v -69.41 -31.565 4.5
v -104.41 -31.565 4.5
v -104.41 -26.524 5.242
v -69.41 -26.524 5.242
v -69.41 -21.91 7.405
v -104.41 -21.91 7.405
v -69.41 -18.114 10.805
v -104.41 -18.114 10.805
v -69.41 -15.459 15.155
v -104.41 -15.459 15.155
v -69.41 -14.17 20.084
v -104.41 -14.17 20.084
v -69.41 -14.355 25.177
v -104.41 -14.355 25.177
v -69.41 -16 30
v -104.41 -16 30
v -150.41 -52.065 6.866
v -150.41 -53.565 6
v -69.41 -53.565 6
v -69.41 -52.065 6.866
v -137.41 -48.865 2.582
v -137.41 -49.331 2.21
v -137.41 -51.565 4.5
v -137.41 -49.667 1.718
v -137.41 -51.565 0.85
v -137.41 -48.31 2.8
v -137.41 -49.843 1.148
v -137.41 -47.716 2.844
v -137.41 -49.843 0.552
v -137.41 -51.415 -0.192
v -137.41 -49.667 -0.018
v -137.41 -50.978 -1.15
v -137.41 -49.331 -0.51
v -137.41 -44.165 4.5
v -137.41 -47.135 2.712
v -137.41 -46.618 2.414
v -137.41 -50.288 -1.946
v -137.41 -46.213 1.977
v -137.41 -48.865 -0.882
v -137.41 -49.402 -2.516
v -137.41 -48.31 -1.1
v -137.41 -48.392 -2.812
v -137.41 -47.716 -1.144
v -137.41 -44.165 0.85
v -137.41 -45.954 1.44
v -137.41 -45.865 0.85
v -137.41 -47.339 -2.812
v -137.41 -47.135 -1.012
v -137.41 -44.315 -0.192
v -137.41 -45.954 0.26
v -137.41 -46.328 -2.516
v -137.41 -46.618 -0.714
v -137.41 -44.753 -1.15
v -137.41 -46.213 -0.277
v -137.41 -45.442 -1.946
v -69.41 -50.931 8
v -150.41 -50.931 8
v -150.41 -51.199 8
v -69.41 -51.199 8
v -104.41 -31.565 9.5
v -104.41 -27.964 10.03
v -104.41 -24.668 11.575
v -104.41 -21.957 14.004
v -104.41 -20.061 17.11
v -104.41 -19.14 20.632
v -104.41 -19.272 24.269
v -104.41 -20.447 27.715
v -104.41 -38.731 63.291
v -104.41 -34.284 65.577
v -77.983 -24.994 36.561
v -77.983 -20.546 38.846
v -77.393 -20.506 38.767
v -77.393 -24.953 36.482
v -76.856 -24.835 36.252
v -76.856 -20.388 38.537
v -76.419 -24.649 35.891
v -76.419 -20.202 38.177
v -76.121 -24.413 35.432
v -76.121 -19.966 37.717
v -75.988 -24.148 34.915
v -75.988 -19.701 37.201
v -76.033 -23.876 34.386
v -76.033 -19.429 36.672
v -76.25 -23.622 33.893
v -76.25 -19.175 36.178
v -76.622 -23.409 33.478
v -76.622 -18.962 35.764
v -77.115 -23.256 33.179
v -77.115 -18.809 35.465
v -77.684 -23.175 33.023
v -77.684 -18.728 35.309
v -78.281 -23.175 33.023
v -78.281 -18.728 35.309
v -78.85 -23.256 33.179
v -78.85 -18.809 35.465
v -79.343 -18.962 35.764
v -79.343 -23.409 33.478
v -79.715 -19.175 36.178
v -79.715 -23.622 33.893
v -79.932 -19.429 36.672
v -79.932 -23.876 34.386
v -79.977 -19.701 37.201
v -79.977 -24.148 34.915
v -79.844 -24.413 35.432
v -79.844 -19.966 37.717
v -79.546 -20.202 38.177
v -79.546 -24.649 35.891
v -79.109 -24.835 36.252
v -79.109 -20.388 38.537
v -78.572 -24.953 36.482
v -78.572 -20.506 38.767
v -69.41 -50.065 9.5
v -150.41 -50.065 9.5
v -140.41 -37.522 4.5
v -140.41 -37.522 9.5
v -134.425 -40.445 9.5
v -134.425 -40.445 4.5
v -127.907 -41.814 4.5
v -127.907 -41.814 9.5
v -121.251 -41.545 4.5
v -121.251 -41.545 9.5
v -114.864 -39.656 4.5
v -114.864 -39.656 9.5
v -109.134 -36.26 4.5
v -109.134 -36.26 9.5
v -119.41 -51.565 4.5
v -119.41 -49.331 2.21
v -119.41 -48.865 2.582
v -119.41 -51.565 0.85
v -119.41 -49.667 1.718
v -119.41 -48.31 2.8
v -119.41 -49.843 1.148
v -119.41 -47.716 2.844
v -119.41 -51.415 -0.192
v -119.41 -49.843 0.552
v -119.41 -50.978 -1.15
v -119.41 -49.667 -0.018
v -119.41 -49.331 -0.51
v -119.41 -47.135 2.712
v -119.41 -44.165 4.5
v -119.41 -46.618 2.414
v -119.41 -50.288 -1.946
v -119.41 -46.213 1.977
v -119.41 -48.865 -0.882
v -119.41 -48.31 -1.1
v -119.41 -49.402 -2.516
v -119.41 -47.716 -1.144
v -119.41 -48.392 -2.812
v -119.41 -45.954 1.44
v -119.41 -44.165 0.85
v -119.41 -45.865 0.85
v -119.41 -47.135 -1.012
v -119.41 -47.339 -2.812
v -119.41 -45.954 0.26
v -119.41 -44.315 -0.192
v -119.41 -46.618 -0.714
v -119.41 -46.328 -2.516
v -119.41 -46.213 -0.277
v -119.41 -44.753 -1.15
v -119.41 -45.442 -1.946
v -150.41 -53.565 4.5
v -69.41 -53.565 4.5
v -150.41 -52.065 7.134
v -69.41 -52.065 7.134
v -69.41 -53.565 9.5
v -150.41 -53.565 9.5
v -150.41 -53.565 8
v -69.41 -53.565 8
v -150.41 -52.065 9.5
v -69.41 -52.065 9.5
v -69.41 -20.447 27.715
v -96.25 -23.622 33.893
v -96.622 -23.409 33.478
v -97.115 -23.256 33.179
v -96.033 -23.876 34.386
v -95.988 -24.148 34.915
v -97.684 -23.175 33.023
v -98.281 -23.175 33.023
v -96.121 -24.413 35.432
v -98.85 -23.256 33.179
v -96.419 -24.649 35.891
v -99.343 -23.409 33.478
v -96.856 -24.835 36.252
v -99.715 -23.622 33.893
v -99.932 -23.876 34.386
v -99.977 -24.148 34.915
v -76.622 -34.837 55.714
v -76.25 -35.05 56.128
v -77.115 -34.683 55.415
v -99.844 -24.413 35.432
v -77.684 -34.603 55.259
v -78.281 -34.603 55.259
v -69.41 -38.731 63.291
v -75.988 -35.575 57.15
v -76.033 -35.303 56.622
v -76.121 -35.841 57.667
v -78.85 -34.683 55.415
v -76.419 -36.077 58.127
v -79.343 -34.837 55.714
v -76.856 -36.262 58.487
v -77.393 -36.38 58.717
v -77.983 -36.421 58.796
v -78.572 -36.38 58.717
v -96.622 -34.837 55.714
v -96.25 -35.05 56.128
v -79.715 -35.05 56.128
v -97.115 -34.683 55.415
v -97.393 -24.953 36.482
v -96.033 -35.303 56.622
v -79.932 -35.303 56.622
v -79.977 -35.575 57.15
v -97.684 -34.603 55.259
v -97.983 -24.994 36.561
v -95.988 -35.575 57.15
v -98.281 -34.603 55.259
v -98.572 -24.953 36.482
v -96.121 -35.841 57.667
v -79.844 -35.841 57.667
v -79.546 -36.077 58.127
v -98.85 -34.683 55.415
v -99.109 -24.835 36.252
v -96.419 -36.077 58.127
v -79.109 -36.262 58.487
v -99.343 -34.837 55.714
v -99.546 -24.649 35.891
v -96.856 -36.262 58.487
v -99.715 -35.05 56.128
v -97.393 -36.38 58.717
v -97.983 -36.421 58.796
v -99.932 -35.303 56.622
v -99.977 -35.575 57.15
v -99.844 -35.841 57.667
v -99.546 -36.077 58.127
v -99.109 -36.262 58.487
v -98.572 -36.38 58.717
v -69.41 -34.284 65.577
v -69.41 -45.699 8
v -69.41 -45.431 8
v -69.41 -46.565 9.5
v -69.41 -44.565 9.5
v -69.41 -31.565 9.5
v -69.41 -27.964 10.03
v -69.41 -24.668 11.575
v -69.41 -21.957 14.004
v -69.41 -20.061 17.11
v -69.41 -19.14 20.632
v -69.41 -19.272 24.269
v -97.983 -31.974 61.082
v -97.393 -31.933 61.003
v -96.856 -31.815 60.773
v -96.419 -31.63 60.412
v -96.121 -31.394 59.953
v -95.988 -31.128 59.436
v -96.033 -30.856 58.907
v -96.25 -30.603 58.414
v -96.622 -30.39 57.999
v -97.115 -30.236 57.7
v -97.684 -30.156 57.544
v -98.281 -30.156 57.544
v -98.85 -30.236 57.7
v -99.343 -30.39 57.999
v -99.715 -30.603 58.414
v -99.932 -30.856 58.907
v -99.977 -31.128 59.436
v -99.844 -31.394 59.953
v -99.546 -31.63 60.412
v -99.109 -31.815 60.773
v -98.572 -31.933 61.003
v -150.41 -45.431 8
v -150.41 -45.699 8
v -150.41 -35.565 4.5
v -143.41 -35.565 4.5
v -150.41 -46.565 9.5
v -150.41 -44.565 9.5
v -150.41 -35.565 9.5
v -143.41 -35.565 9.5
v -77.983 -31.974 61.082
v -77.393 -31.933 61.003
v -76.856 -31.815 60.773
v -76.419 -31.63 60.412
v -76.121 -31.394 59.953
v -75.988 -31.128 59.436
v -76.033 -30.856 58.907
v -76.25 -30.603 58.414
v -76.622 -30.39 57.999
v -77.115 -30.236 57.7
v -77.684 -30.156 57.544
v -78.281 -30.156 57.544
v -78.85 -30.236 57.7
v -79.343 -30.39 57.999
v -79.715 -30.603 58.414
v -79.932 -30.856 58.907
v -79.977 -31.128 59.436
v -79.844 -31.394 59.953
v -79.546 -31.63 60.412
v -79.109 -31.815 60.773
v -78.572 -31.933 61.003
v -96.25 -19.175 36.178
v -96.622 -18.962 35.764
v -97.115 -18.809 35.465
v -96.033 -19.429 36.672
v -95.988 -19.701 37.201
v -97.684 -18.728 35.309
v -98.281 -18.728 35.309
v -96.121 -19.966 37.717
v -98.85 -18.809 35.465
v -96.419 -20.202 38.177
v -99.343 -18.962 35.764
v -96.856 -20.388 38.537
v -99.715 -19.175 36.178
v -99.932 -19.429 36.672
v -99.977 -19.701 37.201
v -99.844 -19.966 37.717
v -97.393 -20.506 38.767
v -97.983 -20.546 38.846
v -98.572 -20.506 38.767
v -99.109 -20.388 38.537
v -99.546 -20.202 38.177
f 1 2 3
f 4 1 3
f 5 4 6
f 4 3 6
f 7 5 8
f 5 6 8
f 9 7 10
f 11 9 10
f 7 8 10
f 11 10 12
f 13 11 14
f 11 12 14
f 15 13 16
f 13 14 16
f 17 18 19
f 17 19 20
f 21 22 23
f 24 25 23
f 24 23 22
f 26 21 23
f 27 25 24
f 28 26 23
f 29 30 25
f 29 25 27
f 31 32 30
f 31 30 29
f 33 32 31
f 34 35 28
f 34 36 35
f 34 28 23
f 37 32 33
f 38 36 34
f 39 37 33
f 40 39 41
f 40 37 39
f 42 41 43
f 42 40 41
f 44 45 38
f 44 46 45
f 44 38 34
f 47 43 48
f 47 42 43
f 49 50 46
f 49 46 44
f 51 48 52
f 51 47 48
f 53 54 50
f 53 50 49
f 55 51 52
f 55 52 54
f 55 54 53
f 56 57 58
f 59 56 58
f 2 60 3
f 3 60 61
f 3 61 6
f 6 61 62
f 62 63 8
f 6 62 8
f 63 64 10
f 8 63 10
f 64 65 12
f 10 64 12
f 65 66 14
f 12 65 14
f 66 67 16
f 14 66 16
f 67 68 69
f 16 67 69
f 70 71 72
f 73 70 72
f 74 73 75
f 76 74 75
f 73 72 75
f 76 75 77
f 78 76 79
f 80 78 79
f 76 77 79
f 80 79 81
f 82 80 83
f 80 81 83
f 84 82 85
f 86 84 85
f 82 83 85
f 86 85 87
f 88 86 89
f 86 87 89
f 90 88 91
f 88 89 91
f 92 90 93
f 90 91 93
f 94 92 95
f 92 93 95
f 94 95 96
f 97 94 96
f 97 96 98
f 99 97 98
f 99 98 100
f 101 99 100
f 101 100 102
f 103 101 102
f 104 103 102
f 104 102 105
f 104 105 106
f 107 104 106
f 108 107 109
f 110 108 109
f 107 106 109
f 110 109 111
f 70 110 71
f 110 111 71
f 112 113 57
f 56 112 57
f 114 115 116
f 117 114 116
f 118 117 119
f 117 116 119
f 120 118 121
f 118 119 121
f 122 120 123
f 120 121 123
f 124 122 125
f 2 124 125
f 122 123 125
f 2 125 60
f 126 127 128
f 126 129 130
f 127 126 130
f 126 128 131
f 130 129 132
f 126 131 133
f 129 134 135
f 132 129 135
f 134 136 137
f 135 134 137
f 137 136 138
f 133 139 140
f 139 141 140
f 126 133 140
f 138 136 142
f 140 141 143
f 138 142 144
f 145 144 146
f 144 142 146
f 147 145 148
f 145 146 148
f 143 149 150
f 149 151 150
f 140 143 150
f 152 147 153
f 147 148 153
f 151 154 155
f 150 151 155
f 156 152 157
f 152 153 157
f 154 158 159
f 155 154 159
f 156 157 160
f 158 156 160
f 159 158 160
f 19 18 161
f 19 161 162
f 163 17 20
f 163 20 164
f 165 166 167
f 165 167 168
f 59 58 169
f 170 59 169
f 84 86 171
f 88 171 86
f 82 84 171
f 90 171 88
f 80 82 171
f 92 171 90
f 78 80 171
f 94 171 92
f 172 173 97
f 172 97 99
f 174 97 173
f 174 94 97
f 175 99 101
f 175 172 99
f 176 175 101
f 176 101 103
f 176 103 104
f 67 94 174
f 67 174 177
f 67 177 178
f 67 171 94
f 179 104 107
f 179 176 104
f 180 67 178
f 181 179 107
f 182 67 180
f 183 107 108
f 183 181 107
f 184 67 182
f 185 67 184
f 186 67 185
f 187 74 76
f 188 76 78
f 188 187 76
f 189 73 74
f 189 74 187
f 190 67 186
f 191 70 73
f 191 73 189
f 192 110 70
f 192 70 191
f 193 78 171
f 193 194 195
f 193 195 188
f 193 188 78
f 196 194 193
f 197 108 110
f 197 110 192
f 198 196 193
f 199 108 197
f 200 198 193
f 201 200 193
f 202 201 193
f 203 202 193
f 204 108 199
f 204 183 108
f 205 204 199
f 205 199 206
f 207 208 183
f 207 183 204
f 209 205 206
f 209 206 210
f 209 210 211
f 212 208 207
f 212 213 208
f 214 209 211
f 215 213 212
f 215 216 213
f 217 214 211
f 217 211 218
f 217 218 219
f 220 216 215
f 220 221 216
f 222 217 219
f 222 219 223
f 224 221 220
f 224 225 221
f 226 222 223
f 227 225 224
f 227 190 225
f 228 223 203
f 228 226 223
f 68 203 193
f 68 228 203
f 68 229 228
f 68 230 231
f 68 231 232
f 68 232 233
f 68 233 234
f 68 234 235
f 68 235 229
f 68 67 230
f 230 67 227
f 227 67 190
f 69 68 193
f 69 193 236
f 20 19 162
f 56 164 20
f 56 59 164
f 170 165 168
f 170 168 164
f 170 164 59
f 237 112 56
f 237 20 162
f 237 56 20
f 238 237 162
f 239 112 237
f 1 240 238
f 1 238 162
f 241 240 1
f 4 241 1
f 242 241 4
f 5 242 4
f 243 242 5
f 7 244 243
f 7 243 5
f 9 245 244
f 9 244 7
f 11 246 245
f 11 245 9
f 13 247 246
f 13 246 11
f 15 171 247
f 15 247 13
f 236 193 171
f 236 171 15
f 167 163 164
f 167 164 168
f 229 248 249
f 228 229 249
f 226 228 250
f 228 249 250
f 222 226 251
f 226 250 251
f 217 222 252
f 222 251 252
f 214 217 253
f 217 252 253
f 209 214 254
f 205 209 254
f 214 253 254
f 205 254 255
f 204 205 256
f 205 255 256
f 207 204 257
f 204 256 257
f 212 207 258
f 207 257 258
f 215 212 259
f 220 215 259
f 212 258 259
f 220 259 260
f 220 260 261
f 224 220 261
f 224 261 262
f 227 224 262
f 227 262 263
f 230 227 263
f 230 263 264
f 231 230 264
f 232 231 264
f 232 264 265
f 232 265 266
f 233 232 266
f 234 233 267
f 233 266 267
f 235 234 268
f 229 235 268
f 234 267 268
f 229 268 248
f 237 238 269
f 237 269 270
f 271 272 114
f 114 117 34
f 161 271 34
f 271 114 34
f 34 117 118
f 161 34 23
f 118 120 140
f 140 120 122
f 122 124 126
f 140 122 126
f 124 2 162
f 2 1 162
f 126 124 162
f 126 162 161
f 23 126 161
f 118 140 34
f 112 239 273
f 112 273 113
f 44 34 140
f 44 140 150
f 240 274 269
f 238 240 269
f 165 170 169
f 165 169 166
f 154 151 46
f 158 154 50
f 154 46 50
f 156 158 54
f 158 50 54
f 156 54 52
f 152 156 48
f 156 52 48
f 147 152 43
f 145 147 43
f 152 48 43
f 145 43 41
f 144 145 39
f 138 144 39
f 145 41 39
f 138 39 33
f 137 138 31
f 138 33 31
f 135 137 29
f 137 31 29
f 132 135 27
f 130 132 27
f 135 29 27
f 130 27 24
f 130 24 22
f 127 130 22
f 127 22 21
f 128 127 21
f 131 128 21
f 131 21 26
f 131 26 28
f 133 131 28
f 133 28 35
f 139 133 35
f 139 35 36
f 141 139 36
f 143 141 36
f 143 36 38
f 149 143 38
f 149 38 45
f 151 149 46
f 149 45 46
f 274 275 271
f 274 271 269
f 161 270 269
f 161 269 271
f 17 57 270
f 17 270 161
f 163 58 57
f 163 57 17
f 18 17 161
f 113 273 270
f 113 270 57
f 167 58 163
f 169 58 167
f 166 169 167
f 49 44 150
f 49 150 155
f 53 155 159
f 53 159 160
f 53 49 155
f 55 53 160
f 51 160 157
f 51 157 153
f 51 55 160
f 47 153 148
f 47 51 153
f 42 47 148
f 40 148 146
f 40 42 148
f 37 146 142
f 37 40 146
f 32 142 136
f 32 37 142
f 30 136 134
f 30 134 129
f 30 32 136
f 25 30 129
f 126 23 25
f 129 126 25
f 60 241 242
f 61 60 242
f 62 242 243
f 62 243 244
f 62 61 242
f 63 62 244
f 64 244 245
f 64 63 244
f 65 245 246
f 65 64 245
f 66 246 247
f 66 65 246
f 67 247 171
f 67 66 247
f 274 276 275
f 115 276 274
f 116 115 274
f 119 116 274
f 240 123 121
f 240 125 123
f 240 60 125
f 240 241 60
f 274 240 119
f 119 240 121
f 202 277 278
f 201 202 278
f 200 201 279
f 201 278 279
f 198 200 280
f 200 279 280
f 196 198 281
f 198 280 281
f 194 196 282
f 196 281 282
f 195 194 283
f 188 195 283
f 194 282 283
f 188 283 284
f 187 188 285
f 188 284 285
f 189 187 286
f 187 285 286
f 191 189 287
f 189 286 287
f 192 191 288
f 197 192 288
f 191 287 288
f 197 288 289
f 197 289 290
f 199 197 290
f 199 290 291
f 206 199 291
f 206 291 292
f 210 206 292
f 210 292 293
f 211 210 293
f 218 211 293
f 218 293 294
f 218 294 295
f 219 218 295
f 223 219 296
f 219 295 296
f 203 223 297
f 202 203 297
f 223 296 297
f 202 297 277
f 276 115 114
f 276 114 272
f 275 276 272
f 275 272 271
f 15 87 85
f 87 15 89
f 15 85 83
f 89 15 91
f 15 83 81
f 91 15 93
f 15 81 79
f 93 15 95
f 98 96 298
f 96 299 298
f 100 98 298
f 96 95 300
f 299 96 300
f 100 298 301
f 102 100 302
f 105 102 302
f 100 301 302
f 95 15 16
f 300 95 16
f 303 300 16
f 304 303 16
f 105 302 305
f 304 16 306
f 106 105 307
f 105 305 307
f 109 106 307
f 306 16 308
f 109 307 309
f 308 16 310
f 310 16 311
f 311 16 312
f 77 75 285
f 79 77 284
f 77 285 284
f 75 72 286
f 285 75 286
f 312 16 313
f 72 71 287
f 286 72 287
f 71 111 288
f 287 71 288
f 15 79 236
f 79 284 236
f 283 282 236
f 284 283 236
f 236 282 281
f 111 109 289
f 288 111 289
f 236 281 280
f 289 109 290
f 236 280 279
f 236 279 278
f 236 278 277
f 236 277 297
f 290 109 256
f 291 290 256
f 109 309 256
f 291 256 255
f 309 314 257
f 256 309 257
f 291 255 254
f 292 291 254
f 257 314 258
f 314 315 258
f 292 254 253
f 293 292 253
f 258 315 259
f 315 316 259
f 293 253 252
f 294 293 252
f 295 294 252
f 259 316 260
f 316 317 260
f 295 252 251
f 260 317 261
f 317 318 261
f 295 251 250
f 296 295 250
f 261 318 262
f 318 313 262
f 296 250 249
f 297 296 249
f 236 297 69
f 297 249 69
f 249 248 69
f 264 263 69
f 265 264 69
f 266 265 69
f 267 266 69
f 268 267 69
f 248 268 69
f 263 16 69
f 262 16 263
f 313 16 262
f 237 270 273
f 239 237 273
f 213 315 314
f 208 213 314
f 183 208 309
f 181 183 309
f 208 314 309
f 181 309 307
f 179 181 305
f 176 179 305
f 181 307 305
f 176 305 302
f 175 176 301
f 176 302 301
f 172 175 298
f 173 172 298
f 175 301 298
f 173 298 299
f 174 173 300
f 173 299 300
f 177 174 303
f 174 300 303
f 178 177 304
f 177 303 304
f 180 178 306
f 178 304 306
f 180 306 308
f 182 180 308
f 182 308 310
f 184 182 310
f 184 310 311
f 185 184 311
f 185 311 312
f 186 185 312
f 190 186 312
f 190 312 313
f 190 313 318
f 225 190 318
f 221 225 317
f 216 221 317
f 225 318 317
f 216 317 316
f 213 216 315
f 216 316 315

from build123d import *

# Parameters (mm, degrees)
PAD018_DEPTH    = 35
SKETCH027_R     = 2
POCKET014_DEPTH = 5
PAD019_DEPTH    = 5
SKETCH029_R     = 2
PAD020_DEPTH    = 18
POCKET015_DEPTH = 81


with BuildPart() as part:
    # Sketch026 → Pad018 (new body)
    with BuildSketch(Plane.YZ):
        with BuildLine():
            Line((-16, 30), (-34.2839170823, 65.5766549317))
            Line((-38.7309989488, 63.2911652964), (-34.2839170823, 65.5766549317))
            Line((-20.4470818665, 27.7145103647), (-38.7309989488, 63.2911652964))
            ThreePointArc((-31.5652664778, 9.5), (-20.8954209204, 15.4876380739), (-20.4470818665, 27.7145103647))
            Line((-53.5652664778, 9.5), (-31.5652664778, 9.5))
            Line((-53.5652664778, 4.5), (-53.5652664778, 9.5))
            Line((-31.5652664778, 4.5), (-53.5652664778, 4.5))
            ThreePointArc((-31.5652664778, 4.5), (-16.627666934, 12.8825899147), (-16, 30))
        make_face()
    extrude(amount=PAD018_DEPTH)

    # Sketch027 (on Face1 of Pad018) → Pocket014 (cut)
    with BuildSketch(Plane(origin=(0, -0.4604723456, -0.2366506407), x_dir=(0, -0.4570979271, 0.8894163733), z_dir=(0, 0.8894163733, 0.4570979271))):
        with Locations((41.942359, 26.427487)):
            Circle(SKETCH027_R)
        with Locations((66.942359, 26.427487)):
            Circle(SKETCH027_R)
        with Locations((66.942359, 6.427487)):
            Circle(SKETCH027_R)
        with Locations((41.942359, 6.427487)):
            Circle(SKETCH027_R)
    extrude(amount=-POCKET014_DEPTH, mode=Mode.SUBTRACT)

    # Sketch028 (on Face13 of Pocket014) → Pad019 (join)
    with BuildSketch(Plane(origin=(0, 0, 9.5), x_dir=(0, -1, 0), z_dir=(0, 0, 1))):
        with BuildLine():
            Line((53.5652664778, 0), (31.5652664778, 0))
            ThreePointArc((37.5221000572, -36), (41.5454869398, -16.8414283547), (31.5652664778, 0))
            Line((37.5221000572, -36), (35.5652664778, -39))
            Line((35.5652664778, -39), (35.5652664778, -46))
            Line((35.5652664778, -46), (53.5652664778, -46))
            Line((53.5652664778, -46), (53.5652664778, 0))
        make_face()
    extrude(amount=-PAD019_DEPTH)

    # Sketch029 (on Face15 of Pad019) → Pad020 (join)
    with BuildSketch(Plane(origin=(-33, 0, 0), x_dir=(0, 1, 0), z_dir=(-1, 0, 0))):
        with BuildLine():
            Line((-44.1652664778, -4.5), (-44.1652664778, -0.85))
            ThreePointArc((-44.1652664778, -0.85), (-47.8652664778, 2.85), (-51.5652664778, -0.85))
            Line((-51.5652664778, -4.5), (-51.5652664778, -0.85))
            Line((-51.5652664778, -4.5), (-44.1652664778, -4.5))
        make_face()
        with Locations((-47.8652664778, -0.85)):
            Circle(SKETCH029_R, mode=Mode.SUBTRACT)
    extrude(amount=-PAD020_DEPTH)

    # Sketch030 (on Face18 of Pad020) → Pocket015 (cut)
    with BuildSketch(Plane(origin=(-46, 0, 0), x_dir=(0, 1, 0), z_dir=(-1, 0, 0))):
        Polygon((-53.5652664778, -6), (-52.0652664778, -6.8660254038), (-52.0652664778, -7.1339745962), (-53.5652664778, -8), align=None)
        Polygon((-50.0652664778, -9.5), (-50.9312918816, -8), (-51.199241074, -8), (-52.0652664778, -9.5), align=None)
        Polygon((-45.699241, -8), (-46.565266, -9.5), (-44.565266, -9.5), (-45.431292, -8), align=None)
    extrude(amount=-POCKET015_DEPTH, mode=Mode.SUBTRACT)


with BuildPart() as part_1:
    # Body006 placement: moved
    add(part.part.moved(Location((-104.41, 0, 0))))


solid = part_1.part
